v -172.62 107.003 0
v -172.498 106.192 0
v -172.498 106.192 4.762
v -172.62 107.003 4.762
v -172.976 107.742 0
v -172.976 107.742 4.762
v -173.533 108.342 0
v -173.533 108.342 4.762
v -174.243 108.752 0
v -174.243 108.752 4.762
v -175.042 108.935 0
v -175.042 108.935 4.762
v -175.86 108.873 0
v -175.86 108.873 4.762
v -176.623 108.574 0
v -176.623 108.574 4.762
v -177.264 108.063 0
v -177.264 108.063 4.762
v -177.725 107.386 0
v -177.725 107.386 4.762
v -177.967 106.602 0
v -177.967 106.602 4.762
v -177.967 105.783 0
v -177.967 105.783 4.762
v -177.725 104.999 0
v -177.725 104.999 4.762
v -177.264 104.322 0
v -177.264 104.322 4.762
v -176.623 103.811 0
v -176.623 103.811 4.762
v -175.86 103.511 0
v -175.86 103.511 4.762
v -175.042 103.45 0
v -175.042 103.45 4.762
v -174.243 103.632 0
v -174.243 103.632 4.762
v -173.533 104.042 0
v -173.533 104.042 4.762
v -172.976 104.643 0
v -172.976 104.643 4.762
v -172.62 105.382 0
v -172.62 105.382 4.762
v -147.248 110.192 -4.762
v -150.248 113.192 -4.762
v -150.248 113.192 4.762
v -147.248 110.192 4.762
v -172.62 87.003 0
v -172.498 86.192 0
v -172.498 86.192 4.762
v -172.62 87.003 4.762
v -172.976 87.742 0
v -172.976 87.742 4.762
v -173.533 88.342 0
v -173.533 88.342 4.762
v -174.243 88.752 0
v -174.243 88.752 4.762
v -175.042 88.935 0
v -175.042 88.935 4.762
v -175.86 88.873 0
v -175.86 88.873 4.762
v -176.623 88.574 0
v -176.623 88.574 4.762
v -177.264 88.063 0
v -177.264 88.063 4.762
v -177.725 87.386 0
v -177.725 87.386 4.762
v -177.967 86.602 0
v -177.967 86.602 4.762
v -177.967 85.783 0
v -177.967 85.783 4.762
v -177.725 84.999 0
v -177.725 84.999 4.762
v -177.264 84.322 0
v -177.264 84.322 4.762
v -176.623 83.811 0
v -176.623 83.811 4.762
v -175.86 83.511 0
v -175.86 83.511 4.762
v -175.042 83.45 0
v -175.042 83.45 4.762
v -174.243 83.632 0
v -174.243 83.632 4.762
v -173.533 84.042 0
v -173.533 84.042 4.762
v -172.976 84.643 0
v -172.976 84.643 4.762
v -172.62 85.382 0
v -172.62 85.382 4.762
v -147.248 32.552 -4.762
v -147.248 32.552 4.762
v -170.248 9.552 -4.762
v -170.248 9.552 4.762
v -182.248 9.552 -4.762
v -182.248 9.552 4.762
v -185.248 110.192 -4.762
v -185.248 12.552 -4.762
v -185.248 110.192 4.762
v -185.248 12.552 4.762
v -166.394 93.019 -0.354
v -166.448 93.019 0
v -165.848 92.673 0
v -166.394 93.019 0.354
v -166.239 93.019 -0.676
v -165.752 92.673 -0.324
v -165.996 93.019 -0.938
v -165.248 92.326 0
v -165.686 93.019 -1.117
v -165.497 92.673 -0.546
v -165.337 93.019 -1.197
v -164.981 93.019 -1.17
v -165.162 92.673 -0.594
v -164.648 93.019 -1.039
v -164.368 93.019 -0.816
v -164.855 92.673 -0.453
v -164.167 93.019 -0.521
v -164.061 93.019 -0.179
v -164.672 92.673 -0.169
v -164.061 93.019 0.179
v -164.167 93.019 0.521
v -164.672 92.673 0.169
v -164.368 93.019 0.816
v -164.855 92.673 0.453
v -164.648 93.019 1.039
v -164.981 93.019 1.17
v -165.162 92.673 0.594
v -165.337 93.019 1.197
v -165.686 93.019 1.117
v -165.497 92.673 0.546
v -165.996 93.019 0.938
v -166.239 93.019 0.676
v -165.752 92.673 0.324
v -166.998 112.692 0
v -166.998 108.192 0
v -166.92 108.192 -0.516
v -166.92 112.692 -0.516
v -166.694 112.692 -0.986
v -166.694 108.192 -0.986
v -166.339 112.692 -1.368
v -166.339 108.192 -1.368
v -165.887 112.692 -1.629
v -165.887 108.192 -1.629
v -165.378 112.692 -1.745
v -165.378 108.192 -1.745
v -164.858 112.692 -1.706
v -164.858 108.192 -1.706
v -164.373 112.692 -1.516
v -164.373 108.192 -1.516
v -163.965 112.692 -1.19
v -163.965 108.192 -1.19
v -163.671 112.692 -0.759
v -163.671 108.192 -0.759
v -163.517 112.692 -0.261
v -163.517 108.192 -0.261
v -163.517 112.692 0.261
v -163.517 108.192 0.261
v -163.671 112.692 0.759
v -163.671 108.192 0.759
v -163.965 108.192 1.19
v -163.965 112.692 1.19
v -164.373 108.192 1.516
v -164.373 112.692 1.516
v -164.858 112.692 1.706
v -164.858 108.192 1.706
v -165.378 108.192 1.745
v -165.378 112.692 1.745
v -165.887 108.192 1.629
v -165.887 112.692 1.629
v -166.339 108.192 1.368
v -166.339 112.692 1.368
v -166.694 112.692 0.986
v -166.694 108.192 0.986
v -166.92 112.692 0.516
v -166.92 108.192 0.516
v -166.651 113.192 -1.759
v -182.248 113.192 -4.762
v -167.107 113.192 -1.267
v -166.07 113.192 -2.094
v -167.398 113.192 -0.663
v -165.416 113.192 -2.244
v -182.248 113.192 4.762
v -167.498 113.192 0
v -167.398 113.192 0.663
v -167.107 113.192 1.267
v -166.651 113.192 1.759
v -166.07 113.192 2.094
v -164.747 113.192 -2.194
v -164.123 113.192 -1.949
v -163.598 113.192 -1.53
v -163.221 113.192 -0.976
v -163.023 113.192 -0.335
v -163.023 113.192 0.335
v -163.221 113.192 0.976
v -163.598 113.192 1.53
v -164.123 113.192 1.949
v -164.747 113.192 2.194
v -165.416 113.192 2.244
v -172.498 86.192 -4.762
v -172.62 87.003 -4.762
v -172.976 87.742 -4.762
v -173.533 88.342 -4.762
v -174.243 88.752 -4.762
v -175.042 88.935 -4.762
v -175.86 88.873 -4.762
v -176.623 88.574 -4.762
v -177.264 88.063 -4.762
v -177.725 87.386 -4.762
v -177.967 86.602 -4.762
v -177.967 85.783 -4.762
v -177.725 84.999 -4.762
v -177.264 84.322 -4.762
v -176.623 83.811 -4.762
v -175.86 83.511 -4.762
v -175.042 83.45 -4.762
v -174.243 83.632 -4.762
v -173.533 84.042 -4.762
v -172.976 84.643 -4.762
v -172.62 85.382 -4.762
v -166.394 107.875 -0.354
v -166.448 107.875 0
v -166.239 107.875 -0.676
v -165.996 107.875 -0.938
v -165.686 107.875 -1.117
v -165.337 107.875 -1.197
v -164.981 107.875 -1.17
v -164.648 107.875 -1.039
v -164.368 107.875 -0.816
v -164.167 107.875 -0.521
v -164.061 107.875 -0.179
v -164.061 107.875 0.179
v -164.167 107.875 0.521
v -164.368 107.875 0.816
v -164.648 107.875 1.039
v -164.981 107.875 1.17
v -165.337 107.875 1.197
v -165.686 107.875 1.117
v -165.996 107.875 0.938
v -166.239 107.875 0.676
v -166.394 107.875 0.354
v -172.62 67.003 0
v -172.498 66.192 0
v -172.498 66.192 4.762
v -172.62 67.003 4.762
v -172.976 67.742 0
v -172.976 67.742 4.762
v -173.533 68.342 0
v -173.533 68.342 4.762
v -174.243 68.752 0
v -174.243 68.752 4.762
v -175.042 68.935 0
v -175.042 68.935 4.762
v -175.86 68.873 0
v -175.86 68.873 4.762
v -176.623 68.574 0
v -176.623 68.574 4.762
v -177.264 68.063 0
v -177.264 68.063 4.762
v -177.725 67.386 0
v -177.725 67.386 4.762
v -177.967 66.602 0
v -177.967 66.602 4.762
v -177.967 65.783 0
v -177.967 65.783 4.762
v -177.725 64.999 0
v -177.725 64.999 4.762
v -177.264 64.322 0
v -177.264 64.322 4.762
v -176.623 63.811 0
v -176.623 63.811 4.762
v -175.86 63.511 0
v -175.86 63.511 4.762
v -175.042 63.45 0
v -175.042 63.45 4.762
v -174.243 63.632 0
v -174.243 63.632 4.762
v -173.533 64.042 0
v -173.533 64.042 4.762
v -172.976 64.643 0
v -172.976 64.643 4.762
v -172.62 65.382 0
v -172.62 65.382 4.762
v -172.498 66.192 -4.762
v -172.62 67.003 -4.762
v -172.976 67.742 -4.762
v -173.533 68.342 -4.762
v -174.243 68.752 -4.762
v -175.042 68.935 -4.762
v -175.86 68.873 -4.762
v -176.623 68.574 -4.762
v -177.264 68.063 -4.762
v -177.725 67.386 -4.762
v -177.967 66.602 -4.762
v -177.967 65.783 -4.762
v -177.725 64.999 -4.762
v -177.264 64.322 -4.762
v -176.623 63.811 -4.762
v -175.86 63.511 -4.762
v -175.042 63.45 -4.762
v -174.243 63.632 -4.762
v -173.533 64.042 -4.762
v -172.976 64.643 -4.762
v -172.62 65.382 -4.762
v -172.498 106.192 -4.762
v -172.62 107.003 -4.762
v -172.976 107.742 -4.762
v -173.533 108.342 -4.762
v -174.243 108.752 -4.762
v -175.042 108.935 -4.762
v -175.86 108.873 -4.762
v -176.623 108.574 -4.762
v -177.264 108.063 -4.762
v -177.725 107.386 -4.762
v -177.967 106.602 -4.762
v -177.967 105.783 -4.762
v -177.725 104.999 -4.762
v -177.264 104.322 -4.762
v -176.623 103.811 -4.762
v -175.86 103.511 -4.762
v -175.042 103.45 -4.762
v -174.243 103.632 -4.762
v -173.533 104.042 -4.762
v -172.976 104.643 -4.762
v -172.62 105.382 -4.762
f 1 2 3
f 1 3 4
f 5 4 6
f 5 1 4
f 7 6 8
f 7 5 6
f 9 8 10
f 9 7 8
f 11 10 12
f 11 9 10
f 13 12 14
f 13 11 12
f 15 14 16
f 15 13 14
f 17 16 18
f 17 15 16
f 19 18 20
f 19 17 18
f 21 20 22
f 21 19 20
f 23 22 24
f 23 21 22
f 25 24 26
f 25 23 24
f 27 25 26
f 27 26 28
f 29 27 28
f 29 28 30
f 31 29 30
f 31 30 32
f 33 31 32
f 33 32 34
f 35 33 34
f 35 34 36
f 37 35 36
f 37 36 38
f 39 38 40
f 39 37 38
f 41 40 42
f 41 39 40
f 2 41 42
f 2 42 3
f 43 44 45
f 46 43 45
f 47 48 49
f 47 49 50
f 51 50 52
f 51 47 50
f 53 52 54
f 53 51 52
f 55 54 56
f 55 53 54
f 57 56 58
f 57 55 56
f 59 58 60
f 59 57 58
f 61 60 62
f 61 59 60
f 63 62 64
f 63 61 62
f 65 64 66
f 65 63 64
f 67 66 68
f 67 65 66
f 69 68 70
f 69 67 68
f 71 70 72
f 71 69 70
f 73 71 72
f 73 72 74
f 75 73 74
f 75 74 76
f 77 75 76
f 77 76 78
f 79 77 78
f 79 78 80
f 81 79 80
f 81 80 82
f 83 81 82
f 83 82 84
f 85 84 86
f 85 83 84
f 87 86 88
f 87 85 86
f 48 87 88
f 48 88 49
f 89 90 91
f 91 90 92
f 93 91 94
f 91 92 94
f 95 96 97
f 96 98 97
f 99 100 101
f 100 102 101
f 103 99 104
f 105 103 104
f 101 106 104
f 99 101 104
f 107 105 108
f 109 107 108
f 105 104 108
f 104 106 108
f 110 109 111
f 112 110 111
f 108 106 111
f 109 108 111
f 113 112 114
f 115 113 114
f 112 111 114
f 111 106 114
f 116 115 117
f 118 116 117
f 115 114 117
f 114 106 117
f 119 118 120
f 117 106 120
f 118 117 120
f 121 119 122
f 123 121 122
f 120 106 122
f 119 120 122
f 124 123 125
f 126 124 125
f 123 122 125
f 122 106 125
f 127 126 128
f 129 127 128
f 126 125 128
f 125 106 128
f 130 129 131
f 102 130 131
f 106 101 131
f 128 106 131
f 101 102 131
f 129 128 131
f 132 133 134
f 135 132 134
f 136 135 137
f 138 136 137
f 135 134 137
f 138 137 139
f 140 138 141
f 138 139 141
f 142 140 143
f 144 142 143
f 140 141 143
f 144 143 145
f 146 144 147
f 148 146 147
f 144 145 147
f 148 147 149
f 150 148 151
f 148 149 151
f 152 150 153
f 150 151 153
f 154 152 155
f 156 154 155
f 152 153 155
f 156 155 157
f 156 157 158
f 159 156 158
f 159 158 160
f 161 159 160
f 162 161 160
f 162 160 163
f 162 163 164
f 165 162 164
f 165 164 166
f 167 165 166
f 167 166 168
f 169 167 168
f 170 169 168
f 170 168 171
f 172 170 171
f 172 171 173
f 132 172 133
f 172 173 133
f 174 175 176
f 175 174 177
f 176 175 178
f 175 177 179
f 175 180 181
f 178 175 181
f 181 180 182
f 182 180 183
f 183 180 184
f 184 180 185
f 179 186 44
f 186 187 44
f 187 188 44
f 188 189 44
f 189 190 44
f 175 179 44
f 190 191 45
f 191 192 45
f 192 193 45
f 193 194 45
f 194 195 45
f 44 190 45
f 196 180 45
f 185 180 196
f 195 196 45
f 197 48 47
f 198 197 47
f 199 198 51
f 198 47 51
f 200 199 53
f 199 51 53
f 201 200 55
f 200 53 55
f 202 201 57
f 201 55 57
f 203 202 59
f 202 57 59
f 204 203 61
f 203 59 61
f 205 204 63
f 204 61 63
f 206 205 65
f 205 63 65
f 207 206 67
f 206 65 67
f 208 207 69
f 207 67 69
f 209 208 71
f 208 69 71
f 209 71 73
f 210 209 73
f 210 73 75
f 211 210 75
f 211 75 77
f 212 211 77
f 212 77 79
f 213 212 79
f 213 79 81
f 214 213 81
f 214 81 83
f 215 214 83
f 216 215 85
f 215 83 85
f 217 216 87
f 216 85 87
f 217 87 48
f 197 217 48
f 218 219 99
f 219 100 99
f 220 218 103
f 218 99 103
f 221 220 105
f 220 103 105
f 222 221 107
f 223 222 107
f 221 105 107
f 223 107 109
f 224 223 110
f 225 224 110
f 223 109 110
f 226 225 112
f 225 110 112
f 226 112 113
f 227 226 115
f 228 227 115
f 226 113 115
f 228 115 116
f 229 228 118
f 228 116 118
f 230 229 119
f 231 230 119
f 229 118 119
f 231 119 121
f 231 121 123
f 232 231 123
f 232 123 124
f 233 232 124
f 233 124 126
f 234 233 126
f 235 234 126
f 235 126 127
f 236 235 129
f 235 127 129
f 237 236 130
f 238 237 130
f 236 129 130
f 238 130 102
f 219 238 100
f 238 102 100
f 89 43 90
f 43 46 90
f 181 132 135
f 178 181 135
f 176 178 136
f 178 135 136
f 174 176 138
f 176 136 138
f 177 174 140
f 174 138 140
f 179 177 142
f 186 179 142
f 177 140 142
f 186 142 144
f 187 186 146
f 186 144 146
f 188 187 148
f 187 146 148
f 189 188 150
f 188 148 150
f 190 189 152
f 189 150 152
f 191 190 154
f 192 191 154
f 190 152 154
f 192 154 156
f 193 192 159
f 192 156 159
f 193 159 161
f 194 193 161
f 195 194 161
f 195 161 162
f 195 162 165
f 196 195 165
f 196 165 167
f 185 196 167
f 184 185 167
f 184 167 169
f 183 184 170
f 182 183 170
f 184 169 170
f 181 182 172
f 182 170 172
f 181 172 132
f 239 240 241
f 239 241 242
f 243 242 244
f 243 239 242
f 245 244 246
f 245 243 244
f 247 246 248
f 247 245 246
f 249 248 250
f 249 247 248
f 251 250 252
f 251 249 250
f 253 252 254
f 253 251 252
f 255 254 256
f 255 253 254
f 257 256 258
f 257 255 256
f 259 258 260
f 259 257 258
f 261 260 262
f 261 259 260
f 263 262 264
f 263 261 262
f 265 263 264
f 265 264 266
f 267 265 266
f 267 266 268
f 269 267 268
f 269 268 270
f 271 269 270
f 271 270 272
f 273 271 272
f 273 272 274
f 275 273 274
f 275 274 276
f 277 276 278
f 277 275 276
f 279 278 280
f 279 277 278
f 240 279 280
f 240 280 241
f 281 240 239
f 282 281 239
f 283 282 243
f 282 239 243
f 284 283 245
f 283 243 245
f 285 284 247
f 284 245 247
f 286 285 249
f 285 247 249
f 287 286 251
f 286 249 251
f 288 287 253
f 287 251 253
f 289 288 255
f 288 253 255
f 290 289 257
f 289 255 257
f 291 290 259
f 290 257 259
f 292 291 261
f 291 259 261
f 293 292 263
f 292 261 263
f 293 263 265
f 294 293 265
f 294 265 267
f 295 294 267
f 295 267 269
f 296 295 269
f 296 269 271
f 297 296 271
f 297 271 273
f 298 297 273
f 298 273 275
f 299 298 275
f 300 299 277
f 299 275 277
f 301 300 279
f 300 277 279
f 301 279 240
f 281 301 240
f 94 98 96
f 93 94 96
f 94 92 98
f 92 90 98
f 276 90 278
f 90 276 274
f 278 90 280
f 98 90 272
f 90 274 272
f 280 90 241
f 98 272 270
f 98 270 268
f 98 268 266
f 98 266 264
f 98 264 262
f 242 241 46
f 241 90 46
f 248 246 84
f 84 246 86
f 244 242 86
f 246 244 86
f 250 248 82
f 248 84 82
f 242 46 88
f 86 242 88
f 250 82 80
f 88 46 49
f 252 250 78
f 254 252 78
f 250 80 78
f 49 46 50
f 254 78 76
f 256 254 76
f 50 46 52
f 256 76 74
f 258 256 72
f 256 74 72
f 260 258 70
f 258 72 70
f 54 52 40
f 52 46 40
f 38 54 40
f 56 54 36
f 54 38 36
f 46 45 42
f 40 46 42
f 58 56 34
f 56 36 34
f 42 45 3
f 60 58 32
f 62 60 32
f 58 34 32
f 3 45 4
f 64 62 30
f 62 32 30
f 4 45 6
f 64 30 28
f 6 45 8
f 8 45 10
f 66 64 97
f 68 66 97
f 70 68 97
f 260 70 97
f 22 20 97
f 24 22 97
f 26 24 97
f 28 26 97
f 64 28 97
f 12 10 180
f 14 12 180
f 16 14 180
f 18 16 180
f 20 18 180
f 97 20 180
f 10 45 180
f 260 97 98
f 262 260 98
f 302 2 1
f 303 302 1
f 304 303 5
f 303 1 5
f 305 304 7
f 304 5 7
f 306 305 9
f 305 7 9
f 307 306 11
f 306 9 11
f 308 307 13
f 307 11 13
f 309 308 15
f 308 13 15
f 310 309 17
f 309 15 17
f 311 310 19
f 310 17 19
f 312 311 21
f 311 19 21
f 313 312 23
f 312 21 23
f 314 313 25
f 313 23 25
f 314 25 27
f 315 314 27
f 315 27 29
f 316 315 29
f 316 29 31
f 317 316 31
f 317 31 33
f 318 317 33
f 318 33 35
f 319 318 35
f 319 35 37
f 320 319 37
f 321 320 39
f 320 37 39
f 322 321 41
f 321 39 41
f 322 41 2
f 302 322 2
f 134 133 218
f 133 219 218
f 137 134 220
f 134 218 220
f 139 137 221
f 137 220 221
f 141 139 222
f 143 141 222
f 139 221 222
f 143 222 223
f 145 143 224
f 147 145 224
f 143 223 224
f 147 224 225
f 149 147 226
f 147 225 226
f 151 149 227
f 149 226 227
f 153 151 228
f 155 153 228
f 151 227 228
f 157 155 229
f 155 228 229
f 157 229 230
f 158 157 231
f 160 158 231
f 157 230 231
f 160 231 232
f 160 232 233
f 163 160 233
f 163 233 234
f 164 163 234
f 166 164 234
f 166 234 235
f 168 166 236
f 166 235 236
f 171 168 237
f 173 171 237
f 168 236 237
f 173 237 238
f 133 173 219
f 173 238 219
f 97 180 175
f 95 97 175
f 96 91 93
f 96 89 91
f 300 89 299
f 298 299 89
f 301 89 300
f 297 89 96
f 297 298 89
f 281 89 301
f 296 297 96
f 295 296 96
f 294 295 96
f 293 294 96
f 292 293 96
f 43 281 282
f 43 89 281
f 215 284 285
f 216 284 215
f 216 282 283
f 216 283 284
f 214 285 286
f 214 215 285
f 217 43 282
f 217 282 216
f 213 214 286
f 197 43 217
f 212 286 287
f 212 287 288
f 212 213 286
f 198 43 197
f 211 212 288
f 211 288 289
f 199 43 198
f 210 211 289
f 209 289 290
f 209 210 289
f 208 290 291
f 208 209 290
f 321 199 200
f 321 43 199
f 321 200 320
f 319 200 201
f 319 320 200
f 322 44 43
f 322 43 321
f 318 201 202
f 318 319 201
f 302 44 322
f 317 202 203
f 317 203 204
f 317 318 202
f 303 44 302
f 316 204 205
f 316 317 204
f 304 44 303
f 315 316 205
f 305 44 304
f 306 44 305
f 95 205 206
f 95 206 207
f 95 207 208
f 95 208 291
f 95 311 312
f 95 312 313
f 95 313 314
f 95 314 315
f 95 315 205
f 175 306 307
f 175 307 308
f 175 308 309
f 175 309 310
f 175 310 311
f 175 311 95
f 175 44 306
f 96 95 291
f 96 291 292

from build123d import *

# Parameters (mm, degrees)
BOSS_EXTRUDE1_DEPTH      = 4.7625
BOSS_EXTRUDE1_DEPTH_BACK = 4.7625
SKETCH1_R                = 2.75
CHAMFER1_SIZE            = 3
CHAMFER2_SIZE            = 0.5


with BuildPart() as part:
    # Sketch1 → Boss-Extrude1 (new, two sides: drawn at the far end of the back side and taken through both)
    with BuildSketch(Plane.XY.offset(-BOSS_EXTRUDE1_DEPTH_BACK)):
        Polygon((-170.247691321, 9.552308679), (-185.247691321, 9.552308679), (-185.247691321, 113.192388155), (-147.247691321, 113.192388155), (-147.247691321, 32.552308679), align=None)
        with Locations((-175.247691321, 66.192388155)):
            Circle(SKETCH1_R, mode=Mode.SUBTRACT)
        with Locations((-175.247691321, 86.192388155)):
            Circle(SKETCH1_R, mode=Mode.SUBTRACT)
        with Locations((-175.247691321, 106.192388155)):
            Circle(SKETCH1_R, mode=Mode.SUBTRACT)
    extrude(amount=BOSS_EXTRUDE1_DEPTH + BOSS_EXTRUDE1_DEPTH_BACK)

    # Sketch2 → Cut-Revolve1 (revolve, cut)
    with BuildSketch(Plane.XY):
        Polygon((-165.247691321, 113.192388155), (-166.997691321, 113.192388155), (-166.997691321, 108.192388155), (-166.447691321, 107.874845507), (-166.447691321, 93.019183075), (-165.247691321, 92.326362752), align=None)
    revolve(axis=Axis((-165.247691321, 113.192388155, 0), (0, -1, 0)), mode=Mode.SUBTRACT)

    # Chamfer1
    chamfer1_edges = [part.edges().sort_by_distance(p)[0] for p in [
        (-185.247691321, 9.552308679, 0),
        (-185.247691321, 113.192388155, 0),
        (-147.247691321, 113.192388155, 0),
    ]]
    chamfer(chamfer1_edges, length=CHAMFER1_SIZE)

    # Chamfer2
    chamfer2_edges = [part.edges().sort_by_distance(p)[0] for p in [
        (-163.497691321, 113.192388155, 0),
    ]]
    chamfer(chamfer2_edges, length=CHAMFER2_SIZE)


solid = part.part
